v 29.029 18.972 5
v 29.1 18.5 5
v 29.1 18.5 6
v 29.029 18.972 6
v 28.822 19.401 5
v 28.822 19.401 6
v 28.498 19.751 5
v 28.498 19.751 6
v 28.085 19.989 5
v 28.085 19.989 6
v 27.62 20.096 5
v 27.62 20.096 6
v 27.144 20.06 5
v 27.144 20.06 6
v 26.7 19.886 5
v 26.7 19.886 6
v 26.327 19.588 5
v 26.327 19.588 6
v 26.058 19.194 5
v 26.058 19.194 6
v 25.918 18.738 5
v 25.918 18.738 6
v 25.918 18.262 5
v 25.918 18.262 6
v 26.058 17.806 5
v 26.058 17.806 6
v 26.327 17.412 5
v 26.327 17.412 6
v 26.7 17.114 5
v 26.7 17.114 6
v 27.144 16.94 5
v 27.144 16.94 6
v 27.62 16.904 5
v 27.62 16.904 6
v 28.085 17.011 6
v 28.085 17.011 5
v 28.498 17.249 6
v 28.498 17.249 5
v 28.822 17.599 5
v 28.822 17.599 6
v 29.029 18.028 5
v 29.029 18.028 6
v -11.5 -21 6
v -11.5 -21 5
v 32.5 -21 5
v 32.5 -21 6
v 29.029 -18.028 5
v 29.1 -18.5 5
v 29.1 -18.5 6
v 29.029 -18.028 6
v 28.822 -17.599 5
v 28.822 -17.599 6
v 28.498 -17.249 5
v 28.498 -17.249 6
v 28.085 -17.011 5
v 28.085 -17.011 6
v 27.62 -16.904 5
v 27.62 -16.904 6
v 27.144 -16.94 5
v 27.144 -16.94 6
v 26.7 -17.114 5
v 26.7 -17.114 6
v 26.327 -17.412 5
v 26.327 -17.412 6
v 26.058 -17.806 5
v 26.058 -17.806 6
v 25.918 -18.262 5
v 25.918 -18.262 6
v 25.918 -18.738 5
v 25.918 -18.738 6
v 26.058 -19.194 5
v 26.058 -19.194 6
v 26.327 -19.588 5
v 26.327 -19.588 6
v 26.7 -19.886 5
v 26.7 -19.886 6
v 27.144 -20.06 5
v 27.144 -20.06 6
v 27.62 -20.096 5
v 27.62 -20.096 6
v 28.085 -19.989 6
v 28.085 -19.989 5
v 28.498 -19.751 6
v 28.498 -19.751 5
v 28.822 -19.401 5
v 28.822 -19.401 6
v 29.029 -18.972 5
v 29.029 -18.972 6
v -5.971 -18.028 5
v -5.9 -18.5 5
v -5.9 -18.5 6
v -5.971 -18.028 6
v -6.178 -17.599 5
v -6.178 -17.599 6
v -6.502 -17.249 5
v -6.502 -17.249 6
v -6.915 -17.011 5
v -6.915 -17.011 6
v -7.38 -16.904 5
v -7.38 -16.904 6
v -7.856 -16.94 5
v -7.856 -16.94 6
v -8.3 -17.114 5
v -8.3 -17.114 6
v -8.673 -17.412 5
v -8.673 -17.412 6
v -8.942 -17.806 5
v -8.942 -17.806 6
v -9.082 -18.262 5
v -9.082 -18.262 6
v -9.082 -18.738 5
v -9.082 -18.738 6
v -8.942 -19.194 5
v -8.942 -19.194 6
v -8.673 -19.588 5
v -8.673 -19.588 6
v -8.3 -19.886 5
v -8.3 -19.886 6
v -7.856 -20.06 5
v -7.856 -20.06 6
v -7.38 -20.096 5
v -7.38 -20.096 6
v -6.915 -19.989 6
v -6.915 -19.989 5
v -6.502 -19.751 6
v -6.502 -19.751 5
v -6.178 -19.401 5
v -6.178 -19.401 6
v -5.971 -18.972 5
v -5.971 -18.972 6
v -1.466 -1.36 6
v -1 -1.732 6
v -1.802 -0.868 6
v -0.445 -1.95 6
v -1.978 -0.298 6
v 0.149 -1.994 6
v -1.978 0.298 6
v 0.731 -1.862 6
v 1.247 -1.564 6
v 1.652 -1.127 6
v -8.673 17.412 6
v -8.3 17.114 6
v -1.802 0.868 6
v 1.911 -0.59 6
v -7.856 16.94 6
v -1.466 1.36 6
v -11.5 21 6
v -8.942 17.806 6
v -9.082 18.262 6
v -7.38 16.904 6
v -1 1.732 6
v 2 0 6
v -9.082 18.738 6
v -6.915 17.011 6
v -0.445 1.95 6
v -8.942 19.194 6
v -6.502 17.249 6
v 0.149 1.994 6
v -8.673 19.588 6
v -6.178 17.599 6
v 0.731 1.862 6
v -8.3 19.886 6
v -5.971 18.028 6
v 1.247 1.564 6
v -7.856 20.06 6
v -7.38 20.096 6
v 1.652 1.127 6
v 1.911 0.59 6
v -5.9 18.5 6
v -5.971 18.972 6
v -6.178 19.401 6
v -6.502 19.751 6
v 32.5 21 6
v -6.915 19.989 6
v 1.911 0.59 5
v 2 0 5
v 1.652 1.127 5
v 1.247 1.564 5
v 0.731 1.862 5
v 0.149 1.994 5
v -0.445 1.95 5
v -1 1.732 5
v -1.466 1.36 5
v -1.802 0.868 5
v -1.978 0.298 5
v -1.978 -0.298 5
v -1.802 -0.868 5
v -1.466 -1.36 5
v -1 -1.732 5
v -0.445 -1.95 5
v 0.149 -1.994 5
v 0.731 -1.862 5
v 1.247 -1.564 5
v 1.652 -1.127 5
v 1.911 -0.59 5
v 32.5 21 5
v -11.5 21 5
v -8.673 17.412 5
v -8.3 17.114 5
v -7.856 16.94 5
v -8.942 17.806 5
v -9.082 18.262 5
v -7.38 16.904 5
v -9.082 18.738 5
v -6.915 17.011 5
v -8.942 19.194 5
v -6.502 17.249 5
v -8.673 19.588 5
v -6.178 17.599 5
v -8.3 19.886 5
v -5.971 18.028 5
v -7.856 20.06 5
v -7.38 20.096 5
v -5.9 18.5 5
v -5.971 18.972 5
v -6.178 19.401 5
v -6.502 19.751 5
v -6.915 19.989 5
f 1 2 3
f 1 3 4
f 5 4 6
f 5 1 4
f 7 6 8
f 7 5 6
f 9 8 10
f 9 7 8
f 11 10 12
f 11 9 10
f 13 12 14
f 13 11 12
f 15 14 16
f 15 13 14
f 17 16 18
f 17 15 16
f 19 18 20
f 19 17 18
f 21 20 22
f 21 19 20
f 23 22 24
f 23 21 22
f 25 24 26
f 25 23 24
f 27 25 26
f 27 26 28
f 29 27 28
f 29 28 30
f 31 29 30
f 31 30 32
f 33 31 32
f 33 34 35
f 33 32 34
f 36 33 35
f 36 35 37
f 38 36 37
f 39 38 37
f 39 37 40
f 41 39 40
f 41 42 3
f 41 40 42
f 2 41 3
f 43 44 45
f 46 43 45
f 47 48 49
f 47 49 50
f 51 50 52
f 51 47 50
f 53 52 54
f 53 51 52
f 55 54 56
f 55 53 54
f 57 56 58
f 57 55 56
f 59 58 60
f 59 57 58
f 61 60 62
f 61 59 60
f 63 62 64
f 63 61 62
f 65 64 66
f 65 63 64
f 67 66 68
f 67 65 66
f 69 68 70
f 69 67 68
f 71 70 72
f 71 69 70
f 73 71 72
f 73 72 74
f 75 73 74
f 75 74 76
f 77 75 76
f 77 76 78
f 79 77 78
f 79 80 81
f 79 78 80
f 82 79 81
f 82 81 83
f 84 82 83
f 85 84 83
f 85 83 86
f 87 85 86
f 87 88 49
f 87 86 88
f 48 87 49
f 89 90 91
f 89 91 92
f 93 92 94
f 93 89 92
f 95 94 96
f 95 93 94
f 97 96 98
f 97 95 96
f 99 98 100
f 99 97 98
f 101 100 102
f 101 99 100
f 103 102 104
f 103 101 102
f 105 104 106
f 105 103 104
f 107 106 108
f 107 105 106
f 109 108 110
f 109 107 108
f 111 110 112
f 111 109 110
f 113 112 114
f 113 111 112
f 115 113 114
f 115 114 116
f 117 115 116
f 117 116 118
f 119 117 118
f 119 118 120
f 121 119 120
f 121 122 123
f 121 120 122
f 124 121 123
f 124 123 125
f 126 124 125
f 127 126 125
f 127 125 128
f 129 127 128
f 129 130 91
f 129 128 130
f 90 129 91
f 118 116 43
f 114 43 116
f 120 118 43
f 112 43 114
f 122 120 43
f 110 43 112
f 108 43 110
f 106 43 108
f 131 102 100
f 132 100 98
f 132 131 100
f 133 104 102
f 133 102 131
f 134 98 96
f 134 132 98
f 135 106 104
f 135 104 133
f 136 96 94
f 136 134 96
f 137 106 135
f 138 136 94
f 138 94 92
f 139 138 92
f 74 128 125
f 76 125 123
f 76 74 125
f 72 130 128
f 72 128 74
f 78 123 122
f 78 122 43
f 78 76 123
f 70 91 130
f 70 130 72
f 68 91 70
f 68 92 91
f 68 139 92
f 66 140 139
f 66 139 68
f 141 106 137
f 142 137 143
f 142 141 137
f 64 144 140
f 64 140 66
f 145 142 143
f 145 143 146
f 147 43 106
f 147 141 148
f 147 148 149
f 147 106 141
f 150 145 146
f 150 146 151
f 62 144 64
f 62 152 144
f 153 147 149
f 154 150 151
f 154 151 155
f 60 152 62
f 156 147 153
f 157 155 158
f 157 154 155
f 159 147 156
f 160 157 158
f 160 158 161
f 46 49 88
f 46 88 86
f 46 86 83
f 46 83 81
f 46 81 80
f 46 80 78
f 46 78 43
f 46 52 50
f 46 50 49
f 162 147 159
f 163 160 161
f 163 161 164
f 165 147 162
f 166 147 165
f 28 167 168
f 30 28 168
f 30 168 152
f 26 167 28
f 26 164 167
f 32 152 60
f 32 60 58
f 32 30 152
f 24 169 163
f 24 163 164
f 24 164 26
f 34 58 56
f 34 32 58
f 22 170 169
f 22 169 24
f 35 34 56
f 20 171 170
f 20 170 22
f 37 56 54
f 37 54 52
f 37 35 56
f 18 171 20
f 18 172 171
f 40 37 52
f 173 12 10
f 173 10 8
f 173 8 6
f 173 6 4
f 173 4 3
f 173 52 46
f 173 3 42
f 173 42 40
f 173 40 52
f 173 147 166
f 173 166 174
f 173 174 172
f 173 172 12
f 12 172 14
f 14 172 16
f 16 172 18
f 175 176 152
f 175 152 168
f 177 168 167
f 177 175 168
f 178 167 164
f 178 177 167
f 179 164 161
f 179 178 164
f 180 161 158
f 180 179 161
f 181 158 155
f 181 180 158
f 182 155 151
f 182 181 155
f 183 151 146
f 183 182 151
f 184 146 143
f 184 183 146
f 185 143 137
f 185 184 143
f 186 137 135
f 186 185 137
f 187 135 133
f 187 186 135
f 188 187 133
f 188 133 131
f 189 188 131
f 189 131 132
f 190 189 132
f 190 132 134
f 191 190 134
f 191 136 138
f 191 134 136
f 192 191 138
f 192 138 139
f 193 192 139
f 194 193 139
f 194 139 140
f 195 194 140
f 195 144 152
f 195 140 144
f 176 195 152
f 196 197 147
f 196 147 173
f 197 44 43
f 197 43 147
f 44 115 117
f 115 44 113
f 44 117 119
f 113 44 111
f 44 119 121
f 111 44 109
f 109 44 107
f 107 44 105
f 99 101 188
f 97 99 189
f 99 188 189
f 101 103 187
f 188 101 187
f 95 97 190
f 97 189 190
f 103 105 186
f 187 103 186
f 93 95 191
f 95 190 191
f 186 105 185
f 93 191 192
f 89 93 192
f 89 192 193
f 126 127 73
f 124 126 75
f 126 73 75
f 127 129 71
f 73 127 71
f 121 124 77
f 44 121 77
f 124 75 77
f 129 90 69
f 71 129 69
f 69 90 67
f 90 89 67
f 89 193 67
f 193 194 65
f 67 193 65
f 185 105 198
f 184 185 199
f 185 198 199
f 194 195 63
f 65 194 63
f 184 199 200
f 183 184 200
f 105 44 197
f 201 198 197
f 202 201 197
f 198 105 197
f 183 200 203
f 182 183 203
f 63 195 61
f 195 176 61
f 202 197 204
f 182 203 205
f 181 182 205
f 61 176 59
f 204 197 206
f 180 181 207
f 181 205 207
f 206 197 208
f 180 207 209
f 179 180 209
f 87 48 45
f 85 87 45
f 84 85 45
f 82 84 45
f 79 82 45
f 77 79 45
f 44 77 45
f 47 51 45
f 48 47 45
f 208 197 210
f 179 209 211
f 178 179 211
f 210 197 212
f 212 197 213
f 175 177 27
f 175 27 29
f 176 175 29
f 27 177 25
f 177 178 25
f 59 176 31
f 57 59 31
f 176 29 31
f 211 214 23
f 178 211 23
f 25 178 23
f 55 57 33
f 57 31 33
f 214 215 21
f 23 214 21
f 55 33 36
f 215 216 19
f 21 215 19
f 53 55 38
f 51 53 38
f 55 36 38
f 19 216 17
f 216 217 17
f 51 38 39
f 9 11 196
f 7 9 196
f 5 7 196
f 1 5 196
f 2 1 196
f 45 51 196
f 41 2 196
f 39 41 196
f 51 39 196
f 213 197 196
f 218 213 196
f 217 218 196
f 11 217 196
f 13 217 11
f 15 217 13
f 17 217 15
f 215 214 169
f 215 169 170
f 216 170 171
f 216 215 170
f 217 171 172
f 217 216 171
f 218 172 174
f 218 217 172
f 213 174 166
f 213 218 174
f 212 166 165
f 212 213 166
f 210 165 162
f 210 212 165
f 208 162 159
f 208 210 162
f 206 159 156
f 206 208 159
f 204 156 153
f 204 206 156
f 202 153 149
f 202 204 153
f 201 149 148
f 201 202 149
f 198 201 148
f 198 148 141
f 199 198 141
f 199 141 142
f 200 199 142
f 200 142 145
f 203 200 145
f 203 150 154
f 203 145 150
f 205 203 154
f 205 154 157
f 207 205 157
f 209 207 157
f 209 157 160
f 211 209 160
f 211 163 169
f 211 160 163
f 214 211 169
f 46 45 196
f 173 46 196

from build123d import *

# Parameters (mm, degrees)
CYLINDER034_R     = 1.6
CYLINDER034_DEPTH = 10
CYLINDER035_R     = 1.6
CYLINDER035_DEPTH = 10
CYLINDER036_R     = 1.6
CYLINDER036_DEPTH = 10
CYLINDER037_R     = 1.6
CYLINDER037_DEPTH = 10
CYLINDER038_R     = 2
CYLINDER038_DEPTH = 10
BOX011_W          = 44
BOX011_H          = 42
BOX011_DEPTH      = 1


with BuildPart() as cylinder034:
    # Cylinder034 → Cylinder034 (new body)
    with BuildSketch(Plane(origin=(-7.5, -18.5, 0), x_dir=(1, 0, 0), z_dir=(0, 0, 1))):
        Circle(CYLINDER034_R)
    extrude(amount=CYLINDER034_DEPTH)


with BuildPart() as cylinder035:
    # Cylinder035 → Cylinder035 (new body)
    with BuildSketch(Plane(origin=(-7.5, 18.5, 0), x_dir=(1, 0, 0), z_dir=(0, 0, 1))):
        Circle(CYLINDER035_R)
    extrude(amount=CYLINDER035_DEPTH)


with BuildPart() as cylinder036:
    # Cylinder036 → Cylinder036 (new body)
    with BuildSketch(Plane(origin=(27.5, -18.5, 0), x_dir=(1, 0, 0), z_dir=(0, 0, 1))):
        Circle(CYLINDER036_R)
    extrude(amount=CYLINDER036_DEPTH)


with BuildPart() as cylinder037:
    # Cylinder037 → Cylinder037 (new body)
    with BuildSketch(Plane(origin=(27.5, 18.5, 0), x_dir=(1, 0, 0), z_dir=(0, 0, 1))):
        Circle(CYLINDER037_R)
    extrude(amount=CYLINDER037_DEPTH)


with BuildPart() as fusion021:
    # Cylinder038 → Cylinder038 (new body)
    with BuildSketch(Plane.XY):
        Circle(CYLINDER038_R)
    extrude(amount=CYLINDER038_DEPTH)

    # Fusion021: union Cylinder034, Cylinder035, Cylinder036, Cylinder037
    add(cylinder034.part)
    add(cylinder035.part)
    add(cylinder036.part)
    add(cylinder037.part)


with BuildPart() as copperplate:
    # Box011 → Box011 (new body)
    with BuildSketch(Plane(origin=(-11.5, -21, 1), x_dir=(1, 0, 0), z_dir=(0, 0, 1))):
        with Locations((22, 21)):
            Rectangle(BOX011_W, BOX011_H)
    extrude(amount=BOX011_DEPTH)

    # Cut010: cut Fusion021
    add(fusion021.part, mode=Mode.SUBTRACT)


with BuildPart() as copperplate_1:
    # Cut010 placement: moved
    add(copperplate.part.moved(Location((0, 0, 4))))


solid = copperplate_1.part
